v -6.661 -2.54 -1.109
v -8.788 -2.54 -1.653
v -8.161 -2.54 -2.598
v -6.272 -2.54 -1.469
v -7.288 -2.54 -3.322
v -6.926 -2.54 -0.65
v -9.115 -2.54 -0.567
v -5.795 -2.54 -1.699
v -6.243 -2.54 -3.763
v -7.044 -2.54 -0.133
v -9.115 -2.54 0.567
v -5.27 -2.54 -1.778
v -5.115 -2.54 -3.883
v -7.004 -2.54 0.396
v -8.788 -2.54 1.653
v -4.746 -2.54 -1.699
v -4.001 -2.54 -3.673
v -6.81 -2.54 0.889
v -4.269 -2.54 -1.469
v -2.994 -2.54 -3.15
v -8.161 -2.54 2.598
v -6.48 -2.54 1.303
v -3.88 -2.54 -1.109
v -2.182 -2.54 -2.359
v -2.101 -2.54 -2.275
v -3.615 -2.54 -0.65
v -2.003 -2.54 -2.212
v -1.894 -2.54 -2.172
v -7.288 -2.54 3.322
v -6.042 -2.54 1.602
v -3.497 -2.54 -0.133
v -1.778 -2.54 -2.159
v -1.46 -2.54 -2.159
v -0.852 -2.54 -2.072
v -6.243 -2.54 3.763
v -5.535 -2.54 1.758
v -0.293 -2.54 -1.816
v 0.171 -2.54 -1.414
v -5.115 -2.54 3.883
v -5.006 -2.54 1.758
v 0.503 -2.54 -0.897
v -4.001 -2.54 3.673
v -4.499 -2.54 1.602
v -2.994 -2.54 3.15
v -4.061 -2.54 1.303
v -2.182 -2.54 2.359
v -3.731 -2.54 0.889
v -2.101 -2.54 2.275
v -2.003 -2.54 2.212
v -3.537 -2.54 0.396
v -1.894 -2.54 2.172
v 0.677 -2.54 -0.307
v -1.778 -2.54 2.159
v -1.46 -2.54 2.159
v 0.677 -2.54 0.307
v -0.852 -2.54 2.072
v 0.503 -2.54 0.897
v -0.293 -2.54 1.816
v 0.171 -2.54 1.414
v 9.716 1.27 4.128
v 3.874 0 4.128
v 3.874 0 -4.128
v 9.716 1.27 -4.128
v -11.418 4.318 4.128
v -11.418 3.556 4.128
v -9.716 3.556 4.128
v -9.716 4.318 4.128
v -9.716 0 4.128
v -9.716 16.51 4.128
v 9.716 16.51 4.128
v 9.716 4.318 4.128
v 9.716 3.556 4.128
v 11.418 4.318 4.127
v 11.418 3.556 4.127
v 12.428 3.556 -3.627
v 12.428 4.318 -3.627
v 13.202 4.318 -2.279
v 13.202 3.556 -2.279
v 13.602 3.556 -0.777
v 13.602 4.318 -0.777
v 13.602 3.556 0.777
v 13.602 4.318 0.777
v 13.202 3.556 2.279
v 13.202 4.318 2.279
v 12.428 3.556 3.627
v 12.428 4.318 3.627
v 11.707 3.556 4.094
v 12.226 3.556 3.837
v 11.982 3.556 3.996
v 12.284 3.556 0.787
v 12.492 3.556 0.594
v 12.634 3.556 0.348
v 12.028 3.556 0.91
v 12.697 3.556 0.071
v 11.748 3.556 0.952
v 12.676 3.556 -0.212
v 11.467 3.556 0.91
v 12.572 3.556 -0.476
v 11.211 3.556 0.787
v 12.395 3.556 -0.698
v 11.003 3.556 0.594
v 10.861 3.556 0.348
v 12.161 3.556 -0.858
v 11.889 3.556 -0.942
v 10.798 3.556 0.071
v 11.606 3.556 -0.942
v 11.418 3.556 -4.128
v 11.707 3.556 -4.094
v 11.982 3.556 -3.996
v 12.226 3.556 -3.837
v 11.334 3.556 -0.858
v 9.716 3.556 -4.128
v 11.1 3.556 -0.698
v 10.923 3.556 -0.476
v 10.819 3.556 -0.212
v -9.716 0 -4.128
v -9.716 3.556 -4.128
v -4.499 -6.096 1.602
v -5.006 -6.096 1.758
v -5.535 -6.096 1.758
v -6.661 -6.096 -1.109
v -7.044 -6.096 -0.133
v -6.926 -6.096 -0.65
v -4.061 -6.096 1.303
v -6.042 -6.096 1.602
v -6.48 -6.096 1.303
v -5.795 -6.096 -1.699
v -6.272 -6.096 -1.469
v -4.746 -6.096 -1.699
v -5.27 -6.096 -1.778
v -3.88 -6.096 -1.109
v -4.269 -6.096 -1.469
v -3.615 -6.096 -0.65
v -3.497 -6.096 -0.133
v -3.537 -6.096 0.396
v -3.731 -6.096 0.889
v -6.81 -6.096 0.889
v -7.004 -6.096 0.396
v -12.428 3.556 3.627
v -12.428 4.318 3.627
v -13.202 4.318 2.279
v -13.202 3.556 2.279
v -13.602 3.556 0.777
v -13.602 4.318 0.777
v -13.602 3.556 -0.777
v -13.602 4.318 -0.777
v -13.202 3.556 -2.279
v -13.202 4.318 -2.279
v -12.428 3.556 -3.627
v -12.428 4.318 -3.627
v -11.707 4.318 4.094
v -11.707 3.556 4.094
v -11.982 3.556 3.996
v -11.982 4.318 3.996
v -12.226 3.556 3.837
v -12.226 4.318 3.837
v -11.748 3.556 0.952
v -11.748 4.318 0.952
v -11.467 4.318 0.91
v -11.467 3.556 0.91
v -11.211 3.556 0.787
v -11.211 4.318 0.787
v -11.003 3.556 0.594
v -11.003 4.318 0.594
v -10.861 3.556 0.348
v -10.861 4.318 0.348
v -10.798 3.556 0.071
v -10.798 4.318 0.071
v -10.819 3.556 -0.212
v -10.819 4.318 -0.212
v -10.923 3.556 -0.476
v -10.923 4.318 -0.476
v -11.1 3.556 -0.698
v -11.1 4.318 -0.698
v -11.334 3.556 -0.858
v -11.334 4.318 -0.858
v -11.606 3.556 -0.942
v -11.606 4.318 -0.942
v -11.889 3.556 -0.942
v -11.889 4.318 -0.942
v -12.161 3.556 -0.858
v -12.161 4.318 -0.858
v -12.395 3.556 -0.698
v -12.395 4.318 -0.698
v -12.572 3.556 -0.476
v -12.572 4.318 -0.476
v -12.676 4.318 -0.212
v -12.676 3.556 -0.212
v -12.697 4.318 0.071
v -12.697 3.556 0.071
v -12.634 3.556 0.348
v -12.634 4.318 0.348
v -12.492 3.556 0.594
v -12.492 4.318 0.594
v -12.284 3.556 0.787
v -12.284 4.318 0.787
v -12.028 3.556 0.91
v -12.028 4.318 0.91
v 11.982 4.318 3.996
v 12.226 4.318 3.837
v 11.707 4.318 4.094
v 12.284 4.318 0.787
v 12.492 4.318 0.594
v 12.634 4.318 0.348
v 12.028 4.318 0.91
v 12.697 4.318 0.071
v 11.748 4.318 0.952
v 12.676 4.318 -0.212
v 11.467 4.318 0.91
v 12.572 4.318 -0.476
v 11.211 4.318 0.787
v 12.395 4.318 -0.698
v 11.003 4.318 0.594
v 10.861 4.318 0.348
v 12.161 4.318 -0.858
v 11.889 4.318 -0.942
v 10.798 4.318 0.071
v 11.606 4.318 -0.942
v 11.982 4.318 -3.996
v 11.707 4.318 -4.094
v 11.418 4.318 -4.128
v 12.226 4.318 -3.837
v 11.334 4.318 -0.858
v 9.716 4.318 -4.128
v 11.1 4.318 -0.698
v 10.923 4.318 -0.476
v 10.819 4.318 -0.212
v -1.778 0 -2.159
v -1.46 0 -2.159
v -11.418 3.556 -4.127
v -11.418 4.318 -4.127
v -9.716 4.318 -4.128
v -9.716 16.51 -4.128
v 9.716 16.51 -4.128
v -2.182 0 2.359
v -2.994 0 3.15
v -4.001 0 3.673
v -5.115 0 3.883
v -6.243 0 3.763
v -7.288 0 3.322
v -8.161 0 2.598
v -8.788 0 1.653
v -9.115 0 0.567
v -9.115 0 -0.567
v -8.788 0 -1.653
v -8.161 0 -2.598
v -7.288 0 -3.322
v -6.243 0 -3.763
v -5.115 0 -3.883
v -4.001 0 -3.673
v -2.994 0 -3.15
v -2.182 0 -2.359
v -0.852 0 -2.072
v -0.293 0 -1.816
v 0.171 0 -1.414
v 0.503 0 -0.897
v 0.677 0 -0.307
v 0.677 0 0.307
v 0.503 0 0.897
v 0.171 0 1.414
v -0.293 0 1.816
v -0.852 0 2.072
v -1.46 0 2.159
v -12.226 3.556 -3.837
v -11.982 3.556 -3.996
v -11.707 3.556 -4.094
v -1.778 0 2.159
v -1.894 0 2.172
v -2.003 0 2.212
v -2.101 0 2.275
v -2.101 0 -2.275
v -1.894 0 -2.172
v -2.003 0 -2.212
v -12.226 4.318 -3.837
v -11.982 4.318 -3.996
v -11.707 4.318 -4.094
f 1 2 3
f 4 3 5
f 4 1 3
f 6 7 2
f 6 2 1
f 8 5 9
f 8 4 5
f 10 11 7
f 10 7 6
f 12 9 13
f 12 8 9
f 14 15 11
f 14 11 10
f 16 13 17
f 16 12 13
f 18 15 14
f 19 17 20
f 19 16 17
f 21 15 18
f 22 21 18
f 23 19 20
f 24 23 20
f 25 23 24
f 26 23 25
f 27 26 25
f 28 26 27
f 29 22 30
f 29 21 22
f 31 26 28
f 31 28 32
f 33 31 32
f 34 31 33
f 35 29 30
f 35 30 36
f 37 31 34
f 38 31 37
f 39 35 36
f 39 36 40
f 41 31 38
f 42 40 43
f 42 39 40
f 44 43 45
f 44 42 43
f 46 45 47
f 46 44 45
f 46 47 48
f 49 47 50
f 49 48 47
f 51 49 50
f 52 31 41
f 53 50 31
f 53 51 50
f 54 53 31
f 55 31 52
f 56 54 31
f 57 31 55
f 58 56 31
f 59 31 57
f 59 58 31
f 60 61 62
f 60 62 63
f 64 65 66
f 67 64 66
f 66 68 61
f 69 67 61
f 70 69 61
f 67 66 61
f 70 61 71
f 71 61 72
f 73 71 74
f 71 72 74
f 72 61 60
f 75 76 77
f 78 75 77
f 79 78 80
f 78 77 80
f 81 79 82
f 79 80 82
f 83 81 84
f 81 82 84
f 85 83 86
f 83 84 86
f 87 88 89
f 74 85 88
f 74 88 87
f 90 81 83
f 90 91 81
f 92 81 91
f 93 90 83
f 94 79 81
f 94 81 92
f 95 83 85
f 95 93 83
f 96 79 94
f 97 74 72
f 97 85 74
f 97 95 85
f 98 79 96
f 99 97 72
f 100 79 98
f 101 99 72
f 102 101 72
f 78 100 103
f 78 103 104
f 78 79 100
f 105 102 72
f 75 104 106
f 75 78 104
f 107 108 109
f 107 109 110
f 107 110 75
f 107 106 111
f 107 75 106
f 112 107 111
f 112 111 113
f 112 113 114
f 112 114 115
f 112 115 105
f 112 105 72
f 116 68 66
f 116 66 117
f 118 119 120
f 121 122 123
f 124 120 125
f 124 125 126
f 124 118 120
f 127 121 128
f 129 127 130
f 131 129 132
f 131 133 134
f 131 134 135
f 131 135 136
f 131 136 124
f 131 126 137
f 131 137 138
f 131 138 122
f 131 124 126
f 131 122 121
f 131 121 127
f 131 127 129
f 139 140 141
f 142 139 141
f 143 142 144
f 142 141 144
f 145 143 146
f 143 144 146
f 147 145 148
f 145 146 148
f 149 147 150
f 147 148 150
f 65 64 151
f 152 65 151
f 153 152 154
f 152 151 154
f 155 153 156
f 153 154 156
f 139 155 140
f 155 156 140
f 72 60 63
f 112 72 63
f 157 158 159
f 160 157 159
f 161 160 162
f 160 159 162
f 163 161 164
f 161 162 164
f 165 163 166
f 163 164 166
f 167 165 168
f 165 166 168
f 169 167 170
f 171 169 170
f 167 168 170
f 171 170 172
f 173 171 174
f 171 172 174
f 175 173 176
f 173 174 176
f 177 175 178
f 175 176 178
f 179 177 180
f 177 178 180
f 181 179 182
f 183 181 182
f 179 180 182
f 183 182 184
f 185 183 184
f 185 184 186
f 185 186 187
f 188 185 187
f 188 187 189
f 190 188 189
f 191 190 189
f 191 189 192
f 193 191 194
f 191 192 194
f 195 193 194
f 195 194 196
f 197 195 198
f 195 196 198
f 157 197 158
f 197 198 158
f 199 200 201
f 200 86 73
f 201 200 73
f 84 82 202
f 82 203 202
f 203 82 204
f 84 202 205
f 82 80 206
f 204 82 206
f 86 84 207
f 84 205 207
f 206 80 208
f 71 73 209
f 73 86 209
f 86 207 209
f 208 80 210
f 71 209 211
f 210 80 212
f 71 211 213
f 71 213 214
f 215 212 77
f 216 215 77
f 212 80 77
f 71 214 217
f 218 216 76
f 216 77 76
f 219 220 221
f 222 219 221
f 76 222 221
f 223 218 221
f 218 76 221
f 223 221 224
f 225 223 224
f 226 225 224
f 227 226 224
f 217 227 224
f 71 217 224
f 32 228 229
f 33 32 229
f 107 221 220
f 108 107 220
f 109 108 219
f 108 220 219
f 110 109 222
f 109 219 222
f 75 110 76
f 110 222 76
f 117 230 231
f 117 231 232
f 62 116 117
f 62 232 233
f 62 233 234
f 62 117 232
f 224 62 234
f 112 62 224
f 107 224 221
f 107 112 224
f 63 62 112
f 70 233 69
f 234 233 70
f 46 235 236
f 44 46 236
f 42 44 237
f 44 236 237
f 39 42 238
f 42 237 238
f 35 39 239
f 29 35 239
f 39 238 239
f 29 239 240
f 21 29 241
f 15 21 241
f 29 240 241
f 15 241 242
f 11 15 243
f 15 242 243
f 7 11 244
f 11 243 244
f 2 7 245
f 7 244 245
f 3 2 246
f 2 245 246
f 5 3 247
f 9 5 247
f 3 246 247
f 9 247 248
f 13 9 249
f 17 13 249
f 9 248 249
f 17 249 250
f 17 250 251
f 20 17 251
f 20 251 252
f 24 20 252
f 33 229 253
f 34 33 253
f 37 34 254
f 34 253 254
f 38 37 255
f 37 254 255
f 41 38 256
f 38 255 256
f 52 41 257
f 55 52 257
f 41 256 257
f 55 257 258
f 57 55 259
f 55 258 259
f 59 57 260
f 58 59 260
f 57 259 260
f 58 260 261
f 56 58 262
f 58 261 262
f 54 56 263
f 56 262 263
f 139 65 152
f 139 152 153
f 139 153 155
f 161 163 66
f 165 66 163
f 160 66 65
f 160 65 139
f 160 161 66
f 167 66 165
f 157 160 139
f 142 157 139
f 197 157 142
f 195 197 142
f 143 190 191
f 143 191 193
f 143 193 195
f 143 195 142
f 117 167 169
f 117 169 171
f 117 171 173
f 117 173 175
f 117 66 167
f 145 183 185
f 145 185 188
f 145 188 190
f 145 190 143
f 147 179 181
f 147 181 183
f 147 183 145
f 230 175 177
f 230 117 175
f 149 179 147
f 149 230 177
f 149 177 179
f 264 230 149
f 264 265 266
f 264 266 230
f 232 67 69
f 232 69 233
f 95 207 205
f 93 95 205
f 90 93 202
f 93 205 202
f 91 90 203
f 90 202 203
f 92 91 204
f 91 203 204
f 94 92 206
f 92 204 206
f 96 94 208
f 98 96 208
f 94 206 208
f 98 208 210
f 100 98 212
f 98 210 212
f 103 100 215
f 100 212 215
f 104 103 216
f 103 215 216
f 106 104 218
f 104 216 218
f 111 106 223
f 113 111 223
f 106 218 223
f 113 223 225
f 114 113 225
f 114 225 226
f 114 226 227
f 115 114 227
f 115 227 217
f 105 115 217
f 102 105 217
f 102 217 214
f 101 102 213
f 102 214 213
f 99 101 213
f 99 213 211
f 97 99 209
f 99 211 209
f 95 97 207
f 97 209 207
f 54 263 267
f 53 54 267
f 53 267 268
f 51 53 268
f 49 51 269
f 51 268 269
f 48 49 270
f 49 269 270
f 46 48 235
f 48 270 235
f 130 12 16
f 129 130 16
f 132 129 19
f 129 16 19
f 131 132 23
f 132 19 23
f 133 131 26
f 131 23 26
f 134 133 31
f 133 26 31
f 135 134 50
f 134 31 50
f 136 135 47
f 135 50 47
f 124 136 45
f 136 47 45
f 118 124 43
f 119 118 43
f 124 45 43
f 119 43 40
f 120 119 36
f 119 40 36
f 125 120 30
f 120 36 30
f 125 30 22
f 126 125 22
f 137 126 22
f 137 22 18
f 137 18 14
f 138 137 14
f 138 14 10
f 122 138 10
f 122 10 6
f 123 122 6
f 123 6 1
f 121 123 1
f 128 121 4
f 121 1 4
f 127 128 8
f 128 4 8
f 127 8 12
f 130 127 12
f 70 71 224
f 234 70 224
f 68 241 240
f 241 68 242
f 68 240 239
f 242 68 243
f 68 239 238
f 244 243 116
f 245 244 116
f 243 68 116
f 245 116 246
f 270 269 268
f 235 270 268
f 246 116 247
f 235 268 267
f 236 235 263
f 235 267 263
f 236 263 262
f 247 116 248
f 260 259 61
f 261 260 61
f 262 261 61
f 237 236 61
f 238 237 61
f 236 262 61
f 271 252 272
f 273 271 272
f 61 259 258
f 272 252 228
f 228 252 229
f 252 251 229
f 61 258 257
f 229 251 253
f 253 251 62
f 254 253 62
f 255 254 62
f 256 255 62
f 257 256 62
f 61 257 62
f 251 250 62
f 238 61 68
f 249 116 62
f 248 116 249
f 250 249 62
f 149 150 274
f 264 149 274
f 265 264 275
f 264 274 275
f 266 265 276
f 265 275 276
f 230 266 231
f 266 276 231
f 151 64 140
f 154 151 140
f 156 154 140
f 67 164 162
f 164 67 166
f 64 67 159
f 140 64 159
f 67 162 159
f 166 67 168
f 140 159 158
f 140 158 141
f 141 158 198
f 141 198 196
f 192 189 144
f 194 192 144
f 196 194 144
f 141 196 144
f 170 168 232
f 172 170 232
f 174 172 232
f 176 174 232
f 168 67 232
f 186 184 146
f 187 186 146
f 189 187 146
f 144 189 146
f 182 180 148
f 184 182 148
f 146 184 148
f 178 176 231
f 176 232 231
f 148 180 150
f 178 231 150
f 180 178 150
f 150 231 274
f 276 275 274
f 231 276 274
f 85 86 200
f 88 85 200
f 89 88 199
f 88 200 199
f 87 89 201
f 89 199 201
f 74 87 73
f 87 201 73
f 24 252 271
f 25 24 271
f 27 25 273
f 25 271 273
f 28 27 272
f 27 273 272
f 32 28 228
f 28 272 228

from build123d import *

# Parameters (mm, degrees)
SKETCH1_W           = 19.431
SKETCH1_H           = 8.255
BOSS_EXTRUDE1_DEPTH = 16.51
SKETCH2_R           = 0.9525
BOSS_EXTRUDE2_DEPTH = 0.762
CUT_EXTRUDE1_DEPTH  = 23.959004361
BOSS_EXTRUDE3_DEPTH = 2.54
SKETCH5_R           = 1.778
BOSS_EXTRUDE4_DEPTH = 3.556


with BuildPart() as part:
    # Sketch1 → Boss-Extrude1 (new body)
    with BuildSketch(Plane(origin=(0, 0, 0), x_dir=(1, 0, 0), z_dir=(0, 1, 0))):
        Rectangle(SKETCH1_W, SKETCH1_H)
    extrude(amount=BOSS_EXTRUDE1_DEPTH)

    # Sketch2 → Boss-Extrude2 (add)
    # profile 1 of 2: a face of its own
    with BuildSketch(Plane(origin=(0, 4.318, 0), x_dir=(1, 0, 0), z_dir=(0, 1, 0))):
        with BuildLine():
            Line((9.7155, -4.1275), (9.7155, 4.1275))
            Line((9.7155, 4.1275), (11.417923657, 4.1275))
            ThreePointArc((11.417923657, 4.1275), (11.981565763, 3.995571868), (12.428105113, 3.62719697))
            ThreePointArc((12.428105113, 3.62719697), (13.6525, 0), (12.428105113, -3.62719697))
            ThreePointArc((12.428105113, -3.62719697), (11.981565763, -3.995571868), (11.417923657, -4.1275))
            Line((11.417923657, -4.1275), (9.7155, -4.1275))
        make_face()
        with Locations(Location((11.7475, 0, 0), (0, 0, 270))):
            Circle(SKETCH2_R, mode=Mode.SUBTRACT)
    # profile 2 of 2: a face of its own
    with BuildSketch(Plane(origin=(0, 4.318, 0), x_dir=(1, 0, 0), z_dir=(0, 1, 0))):
        with BuildLine():
            Line((-9.7155, 4.1275), (-9.7155, -4.1275))
            Line((-9.7155, -4.1275), (-11.417923657, -4.1275))
            ThreePointArc((-11.417923657, -4.1275), (-11.981565763, -3.995571868), (-12.428105113, -3.62719697))
            ThreePointArc((-12.428105113, -3.62719697), (-13.6525, 0), (-12.428105113, 3.62719697))
            ThreePointArc((-12.428105113, 3.62719697), (-11.981565763, 3.995571868), (-11.417923657, 4.1275))
            Line((-11.417923657, 4.1275), (-9.7155, 4.1275))
        make_face()
        with Locations(Location((-11.7475, 0, 0), (0, 0, 270))):
            Circle(SKETCH2_R, mode=Mode.SUBTRACT)
    extrude(amount=-BOSS_EXTRUDE2_DEPTH)

    # Sketch3 → Cut-Extrude1 (cut, through all)
    with BuildSketch(Plane.XY.offset(4.1275)):
        Polygon((9.7155, 0), (3.8735, 0), (9.7155, 1.27), align=None)
    extrude(amount=-CUT_EXTRUDE1_DEPTH, mode=Mode.SUBTRACT)

    # Sketch4 → Boss-Extrude3 (add)
    with BuildSketch(Plane.XZ):
        with BuildLine():
            Line((-1.4605, 2.159), (-1.778207824, 2.159))
            ThreePointArc((-1.778207824, 2.159), (-2.003413909, 2.211647148), (-2.181941024, 2.358676301))
            ThreePointArc((-2.181941024, 2.358676301), (-9.1567, 0), (-2.181941024, -2.358676301))
            ThreePointArc((-2.181941024, -2.358676301), (-2.003413909, -2.211647148), (-1.778207824, -2.159))
            Line((-1.778207824, -2.159), (-1.4605, -2.159))
            ThreePointArc((-1.4605, -2.159), (0.6985, 0), (-1.4605, 2.159))
        make_face()
    extrude(amount=BOSS_EXTRUDE3_DEPTH)

    # Sketch5 → Boss-Extrude4 (add)
    with BuildSketch(Plane.XZ.offset(2.54)):
        with Locations(Location((-5.2705, 0, 0), (0, 0, 270))):
            Circle(SKETCH5_R)
    extrude(amount=BOSS_EXTRUDE4_DEPTH)


solid = part.part
